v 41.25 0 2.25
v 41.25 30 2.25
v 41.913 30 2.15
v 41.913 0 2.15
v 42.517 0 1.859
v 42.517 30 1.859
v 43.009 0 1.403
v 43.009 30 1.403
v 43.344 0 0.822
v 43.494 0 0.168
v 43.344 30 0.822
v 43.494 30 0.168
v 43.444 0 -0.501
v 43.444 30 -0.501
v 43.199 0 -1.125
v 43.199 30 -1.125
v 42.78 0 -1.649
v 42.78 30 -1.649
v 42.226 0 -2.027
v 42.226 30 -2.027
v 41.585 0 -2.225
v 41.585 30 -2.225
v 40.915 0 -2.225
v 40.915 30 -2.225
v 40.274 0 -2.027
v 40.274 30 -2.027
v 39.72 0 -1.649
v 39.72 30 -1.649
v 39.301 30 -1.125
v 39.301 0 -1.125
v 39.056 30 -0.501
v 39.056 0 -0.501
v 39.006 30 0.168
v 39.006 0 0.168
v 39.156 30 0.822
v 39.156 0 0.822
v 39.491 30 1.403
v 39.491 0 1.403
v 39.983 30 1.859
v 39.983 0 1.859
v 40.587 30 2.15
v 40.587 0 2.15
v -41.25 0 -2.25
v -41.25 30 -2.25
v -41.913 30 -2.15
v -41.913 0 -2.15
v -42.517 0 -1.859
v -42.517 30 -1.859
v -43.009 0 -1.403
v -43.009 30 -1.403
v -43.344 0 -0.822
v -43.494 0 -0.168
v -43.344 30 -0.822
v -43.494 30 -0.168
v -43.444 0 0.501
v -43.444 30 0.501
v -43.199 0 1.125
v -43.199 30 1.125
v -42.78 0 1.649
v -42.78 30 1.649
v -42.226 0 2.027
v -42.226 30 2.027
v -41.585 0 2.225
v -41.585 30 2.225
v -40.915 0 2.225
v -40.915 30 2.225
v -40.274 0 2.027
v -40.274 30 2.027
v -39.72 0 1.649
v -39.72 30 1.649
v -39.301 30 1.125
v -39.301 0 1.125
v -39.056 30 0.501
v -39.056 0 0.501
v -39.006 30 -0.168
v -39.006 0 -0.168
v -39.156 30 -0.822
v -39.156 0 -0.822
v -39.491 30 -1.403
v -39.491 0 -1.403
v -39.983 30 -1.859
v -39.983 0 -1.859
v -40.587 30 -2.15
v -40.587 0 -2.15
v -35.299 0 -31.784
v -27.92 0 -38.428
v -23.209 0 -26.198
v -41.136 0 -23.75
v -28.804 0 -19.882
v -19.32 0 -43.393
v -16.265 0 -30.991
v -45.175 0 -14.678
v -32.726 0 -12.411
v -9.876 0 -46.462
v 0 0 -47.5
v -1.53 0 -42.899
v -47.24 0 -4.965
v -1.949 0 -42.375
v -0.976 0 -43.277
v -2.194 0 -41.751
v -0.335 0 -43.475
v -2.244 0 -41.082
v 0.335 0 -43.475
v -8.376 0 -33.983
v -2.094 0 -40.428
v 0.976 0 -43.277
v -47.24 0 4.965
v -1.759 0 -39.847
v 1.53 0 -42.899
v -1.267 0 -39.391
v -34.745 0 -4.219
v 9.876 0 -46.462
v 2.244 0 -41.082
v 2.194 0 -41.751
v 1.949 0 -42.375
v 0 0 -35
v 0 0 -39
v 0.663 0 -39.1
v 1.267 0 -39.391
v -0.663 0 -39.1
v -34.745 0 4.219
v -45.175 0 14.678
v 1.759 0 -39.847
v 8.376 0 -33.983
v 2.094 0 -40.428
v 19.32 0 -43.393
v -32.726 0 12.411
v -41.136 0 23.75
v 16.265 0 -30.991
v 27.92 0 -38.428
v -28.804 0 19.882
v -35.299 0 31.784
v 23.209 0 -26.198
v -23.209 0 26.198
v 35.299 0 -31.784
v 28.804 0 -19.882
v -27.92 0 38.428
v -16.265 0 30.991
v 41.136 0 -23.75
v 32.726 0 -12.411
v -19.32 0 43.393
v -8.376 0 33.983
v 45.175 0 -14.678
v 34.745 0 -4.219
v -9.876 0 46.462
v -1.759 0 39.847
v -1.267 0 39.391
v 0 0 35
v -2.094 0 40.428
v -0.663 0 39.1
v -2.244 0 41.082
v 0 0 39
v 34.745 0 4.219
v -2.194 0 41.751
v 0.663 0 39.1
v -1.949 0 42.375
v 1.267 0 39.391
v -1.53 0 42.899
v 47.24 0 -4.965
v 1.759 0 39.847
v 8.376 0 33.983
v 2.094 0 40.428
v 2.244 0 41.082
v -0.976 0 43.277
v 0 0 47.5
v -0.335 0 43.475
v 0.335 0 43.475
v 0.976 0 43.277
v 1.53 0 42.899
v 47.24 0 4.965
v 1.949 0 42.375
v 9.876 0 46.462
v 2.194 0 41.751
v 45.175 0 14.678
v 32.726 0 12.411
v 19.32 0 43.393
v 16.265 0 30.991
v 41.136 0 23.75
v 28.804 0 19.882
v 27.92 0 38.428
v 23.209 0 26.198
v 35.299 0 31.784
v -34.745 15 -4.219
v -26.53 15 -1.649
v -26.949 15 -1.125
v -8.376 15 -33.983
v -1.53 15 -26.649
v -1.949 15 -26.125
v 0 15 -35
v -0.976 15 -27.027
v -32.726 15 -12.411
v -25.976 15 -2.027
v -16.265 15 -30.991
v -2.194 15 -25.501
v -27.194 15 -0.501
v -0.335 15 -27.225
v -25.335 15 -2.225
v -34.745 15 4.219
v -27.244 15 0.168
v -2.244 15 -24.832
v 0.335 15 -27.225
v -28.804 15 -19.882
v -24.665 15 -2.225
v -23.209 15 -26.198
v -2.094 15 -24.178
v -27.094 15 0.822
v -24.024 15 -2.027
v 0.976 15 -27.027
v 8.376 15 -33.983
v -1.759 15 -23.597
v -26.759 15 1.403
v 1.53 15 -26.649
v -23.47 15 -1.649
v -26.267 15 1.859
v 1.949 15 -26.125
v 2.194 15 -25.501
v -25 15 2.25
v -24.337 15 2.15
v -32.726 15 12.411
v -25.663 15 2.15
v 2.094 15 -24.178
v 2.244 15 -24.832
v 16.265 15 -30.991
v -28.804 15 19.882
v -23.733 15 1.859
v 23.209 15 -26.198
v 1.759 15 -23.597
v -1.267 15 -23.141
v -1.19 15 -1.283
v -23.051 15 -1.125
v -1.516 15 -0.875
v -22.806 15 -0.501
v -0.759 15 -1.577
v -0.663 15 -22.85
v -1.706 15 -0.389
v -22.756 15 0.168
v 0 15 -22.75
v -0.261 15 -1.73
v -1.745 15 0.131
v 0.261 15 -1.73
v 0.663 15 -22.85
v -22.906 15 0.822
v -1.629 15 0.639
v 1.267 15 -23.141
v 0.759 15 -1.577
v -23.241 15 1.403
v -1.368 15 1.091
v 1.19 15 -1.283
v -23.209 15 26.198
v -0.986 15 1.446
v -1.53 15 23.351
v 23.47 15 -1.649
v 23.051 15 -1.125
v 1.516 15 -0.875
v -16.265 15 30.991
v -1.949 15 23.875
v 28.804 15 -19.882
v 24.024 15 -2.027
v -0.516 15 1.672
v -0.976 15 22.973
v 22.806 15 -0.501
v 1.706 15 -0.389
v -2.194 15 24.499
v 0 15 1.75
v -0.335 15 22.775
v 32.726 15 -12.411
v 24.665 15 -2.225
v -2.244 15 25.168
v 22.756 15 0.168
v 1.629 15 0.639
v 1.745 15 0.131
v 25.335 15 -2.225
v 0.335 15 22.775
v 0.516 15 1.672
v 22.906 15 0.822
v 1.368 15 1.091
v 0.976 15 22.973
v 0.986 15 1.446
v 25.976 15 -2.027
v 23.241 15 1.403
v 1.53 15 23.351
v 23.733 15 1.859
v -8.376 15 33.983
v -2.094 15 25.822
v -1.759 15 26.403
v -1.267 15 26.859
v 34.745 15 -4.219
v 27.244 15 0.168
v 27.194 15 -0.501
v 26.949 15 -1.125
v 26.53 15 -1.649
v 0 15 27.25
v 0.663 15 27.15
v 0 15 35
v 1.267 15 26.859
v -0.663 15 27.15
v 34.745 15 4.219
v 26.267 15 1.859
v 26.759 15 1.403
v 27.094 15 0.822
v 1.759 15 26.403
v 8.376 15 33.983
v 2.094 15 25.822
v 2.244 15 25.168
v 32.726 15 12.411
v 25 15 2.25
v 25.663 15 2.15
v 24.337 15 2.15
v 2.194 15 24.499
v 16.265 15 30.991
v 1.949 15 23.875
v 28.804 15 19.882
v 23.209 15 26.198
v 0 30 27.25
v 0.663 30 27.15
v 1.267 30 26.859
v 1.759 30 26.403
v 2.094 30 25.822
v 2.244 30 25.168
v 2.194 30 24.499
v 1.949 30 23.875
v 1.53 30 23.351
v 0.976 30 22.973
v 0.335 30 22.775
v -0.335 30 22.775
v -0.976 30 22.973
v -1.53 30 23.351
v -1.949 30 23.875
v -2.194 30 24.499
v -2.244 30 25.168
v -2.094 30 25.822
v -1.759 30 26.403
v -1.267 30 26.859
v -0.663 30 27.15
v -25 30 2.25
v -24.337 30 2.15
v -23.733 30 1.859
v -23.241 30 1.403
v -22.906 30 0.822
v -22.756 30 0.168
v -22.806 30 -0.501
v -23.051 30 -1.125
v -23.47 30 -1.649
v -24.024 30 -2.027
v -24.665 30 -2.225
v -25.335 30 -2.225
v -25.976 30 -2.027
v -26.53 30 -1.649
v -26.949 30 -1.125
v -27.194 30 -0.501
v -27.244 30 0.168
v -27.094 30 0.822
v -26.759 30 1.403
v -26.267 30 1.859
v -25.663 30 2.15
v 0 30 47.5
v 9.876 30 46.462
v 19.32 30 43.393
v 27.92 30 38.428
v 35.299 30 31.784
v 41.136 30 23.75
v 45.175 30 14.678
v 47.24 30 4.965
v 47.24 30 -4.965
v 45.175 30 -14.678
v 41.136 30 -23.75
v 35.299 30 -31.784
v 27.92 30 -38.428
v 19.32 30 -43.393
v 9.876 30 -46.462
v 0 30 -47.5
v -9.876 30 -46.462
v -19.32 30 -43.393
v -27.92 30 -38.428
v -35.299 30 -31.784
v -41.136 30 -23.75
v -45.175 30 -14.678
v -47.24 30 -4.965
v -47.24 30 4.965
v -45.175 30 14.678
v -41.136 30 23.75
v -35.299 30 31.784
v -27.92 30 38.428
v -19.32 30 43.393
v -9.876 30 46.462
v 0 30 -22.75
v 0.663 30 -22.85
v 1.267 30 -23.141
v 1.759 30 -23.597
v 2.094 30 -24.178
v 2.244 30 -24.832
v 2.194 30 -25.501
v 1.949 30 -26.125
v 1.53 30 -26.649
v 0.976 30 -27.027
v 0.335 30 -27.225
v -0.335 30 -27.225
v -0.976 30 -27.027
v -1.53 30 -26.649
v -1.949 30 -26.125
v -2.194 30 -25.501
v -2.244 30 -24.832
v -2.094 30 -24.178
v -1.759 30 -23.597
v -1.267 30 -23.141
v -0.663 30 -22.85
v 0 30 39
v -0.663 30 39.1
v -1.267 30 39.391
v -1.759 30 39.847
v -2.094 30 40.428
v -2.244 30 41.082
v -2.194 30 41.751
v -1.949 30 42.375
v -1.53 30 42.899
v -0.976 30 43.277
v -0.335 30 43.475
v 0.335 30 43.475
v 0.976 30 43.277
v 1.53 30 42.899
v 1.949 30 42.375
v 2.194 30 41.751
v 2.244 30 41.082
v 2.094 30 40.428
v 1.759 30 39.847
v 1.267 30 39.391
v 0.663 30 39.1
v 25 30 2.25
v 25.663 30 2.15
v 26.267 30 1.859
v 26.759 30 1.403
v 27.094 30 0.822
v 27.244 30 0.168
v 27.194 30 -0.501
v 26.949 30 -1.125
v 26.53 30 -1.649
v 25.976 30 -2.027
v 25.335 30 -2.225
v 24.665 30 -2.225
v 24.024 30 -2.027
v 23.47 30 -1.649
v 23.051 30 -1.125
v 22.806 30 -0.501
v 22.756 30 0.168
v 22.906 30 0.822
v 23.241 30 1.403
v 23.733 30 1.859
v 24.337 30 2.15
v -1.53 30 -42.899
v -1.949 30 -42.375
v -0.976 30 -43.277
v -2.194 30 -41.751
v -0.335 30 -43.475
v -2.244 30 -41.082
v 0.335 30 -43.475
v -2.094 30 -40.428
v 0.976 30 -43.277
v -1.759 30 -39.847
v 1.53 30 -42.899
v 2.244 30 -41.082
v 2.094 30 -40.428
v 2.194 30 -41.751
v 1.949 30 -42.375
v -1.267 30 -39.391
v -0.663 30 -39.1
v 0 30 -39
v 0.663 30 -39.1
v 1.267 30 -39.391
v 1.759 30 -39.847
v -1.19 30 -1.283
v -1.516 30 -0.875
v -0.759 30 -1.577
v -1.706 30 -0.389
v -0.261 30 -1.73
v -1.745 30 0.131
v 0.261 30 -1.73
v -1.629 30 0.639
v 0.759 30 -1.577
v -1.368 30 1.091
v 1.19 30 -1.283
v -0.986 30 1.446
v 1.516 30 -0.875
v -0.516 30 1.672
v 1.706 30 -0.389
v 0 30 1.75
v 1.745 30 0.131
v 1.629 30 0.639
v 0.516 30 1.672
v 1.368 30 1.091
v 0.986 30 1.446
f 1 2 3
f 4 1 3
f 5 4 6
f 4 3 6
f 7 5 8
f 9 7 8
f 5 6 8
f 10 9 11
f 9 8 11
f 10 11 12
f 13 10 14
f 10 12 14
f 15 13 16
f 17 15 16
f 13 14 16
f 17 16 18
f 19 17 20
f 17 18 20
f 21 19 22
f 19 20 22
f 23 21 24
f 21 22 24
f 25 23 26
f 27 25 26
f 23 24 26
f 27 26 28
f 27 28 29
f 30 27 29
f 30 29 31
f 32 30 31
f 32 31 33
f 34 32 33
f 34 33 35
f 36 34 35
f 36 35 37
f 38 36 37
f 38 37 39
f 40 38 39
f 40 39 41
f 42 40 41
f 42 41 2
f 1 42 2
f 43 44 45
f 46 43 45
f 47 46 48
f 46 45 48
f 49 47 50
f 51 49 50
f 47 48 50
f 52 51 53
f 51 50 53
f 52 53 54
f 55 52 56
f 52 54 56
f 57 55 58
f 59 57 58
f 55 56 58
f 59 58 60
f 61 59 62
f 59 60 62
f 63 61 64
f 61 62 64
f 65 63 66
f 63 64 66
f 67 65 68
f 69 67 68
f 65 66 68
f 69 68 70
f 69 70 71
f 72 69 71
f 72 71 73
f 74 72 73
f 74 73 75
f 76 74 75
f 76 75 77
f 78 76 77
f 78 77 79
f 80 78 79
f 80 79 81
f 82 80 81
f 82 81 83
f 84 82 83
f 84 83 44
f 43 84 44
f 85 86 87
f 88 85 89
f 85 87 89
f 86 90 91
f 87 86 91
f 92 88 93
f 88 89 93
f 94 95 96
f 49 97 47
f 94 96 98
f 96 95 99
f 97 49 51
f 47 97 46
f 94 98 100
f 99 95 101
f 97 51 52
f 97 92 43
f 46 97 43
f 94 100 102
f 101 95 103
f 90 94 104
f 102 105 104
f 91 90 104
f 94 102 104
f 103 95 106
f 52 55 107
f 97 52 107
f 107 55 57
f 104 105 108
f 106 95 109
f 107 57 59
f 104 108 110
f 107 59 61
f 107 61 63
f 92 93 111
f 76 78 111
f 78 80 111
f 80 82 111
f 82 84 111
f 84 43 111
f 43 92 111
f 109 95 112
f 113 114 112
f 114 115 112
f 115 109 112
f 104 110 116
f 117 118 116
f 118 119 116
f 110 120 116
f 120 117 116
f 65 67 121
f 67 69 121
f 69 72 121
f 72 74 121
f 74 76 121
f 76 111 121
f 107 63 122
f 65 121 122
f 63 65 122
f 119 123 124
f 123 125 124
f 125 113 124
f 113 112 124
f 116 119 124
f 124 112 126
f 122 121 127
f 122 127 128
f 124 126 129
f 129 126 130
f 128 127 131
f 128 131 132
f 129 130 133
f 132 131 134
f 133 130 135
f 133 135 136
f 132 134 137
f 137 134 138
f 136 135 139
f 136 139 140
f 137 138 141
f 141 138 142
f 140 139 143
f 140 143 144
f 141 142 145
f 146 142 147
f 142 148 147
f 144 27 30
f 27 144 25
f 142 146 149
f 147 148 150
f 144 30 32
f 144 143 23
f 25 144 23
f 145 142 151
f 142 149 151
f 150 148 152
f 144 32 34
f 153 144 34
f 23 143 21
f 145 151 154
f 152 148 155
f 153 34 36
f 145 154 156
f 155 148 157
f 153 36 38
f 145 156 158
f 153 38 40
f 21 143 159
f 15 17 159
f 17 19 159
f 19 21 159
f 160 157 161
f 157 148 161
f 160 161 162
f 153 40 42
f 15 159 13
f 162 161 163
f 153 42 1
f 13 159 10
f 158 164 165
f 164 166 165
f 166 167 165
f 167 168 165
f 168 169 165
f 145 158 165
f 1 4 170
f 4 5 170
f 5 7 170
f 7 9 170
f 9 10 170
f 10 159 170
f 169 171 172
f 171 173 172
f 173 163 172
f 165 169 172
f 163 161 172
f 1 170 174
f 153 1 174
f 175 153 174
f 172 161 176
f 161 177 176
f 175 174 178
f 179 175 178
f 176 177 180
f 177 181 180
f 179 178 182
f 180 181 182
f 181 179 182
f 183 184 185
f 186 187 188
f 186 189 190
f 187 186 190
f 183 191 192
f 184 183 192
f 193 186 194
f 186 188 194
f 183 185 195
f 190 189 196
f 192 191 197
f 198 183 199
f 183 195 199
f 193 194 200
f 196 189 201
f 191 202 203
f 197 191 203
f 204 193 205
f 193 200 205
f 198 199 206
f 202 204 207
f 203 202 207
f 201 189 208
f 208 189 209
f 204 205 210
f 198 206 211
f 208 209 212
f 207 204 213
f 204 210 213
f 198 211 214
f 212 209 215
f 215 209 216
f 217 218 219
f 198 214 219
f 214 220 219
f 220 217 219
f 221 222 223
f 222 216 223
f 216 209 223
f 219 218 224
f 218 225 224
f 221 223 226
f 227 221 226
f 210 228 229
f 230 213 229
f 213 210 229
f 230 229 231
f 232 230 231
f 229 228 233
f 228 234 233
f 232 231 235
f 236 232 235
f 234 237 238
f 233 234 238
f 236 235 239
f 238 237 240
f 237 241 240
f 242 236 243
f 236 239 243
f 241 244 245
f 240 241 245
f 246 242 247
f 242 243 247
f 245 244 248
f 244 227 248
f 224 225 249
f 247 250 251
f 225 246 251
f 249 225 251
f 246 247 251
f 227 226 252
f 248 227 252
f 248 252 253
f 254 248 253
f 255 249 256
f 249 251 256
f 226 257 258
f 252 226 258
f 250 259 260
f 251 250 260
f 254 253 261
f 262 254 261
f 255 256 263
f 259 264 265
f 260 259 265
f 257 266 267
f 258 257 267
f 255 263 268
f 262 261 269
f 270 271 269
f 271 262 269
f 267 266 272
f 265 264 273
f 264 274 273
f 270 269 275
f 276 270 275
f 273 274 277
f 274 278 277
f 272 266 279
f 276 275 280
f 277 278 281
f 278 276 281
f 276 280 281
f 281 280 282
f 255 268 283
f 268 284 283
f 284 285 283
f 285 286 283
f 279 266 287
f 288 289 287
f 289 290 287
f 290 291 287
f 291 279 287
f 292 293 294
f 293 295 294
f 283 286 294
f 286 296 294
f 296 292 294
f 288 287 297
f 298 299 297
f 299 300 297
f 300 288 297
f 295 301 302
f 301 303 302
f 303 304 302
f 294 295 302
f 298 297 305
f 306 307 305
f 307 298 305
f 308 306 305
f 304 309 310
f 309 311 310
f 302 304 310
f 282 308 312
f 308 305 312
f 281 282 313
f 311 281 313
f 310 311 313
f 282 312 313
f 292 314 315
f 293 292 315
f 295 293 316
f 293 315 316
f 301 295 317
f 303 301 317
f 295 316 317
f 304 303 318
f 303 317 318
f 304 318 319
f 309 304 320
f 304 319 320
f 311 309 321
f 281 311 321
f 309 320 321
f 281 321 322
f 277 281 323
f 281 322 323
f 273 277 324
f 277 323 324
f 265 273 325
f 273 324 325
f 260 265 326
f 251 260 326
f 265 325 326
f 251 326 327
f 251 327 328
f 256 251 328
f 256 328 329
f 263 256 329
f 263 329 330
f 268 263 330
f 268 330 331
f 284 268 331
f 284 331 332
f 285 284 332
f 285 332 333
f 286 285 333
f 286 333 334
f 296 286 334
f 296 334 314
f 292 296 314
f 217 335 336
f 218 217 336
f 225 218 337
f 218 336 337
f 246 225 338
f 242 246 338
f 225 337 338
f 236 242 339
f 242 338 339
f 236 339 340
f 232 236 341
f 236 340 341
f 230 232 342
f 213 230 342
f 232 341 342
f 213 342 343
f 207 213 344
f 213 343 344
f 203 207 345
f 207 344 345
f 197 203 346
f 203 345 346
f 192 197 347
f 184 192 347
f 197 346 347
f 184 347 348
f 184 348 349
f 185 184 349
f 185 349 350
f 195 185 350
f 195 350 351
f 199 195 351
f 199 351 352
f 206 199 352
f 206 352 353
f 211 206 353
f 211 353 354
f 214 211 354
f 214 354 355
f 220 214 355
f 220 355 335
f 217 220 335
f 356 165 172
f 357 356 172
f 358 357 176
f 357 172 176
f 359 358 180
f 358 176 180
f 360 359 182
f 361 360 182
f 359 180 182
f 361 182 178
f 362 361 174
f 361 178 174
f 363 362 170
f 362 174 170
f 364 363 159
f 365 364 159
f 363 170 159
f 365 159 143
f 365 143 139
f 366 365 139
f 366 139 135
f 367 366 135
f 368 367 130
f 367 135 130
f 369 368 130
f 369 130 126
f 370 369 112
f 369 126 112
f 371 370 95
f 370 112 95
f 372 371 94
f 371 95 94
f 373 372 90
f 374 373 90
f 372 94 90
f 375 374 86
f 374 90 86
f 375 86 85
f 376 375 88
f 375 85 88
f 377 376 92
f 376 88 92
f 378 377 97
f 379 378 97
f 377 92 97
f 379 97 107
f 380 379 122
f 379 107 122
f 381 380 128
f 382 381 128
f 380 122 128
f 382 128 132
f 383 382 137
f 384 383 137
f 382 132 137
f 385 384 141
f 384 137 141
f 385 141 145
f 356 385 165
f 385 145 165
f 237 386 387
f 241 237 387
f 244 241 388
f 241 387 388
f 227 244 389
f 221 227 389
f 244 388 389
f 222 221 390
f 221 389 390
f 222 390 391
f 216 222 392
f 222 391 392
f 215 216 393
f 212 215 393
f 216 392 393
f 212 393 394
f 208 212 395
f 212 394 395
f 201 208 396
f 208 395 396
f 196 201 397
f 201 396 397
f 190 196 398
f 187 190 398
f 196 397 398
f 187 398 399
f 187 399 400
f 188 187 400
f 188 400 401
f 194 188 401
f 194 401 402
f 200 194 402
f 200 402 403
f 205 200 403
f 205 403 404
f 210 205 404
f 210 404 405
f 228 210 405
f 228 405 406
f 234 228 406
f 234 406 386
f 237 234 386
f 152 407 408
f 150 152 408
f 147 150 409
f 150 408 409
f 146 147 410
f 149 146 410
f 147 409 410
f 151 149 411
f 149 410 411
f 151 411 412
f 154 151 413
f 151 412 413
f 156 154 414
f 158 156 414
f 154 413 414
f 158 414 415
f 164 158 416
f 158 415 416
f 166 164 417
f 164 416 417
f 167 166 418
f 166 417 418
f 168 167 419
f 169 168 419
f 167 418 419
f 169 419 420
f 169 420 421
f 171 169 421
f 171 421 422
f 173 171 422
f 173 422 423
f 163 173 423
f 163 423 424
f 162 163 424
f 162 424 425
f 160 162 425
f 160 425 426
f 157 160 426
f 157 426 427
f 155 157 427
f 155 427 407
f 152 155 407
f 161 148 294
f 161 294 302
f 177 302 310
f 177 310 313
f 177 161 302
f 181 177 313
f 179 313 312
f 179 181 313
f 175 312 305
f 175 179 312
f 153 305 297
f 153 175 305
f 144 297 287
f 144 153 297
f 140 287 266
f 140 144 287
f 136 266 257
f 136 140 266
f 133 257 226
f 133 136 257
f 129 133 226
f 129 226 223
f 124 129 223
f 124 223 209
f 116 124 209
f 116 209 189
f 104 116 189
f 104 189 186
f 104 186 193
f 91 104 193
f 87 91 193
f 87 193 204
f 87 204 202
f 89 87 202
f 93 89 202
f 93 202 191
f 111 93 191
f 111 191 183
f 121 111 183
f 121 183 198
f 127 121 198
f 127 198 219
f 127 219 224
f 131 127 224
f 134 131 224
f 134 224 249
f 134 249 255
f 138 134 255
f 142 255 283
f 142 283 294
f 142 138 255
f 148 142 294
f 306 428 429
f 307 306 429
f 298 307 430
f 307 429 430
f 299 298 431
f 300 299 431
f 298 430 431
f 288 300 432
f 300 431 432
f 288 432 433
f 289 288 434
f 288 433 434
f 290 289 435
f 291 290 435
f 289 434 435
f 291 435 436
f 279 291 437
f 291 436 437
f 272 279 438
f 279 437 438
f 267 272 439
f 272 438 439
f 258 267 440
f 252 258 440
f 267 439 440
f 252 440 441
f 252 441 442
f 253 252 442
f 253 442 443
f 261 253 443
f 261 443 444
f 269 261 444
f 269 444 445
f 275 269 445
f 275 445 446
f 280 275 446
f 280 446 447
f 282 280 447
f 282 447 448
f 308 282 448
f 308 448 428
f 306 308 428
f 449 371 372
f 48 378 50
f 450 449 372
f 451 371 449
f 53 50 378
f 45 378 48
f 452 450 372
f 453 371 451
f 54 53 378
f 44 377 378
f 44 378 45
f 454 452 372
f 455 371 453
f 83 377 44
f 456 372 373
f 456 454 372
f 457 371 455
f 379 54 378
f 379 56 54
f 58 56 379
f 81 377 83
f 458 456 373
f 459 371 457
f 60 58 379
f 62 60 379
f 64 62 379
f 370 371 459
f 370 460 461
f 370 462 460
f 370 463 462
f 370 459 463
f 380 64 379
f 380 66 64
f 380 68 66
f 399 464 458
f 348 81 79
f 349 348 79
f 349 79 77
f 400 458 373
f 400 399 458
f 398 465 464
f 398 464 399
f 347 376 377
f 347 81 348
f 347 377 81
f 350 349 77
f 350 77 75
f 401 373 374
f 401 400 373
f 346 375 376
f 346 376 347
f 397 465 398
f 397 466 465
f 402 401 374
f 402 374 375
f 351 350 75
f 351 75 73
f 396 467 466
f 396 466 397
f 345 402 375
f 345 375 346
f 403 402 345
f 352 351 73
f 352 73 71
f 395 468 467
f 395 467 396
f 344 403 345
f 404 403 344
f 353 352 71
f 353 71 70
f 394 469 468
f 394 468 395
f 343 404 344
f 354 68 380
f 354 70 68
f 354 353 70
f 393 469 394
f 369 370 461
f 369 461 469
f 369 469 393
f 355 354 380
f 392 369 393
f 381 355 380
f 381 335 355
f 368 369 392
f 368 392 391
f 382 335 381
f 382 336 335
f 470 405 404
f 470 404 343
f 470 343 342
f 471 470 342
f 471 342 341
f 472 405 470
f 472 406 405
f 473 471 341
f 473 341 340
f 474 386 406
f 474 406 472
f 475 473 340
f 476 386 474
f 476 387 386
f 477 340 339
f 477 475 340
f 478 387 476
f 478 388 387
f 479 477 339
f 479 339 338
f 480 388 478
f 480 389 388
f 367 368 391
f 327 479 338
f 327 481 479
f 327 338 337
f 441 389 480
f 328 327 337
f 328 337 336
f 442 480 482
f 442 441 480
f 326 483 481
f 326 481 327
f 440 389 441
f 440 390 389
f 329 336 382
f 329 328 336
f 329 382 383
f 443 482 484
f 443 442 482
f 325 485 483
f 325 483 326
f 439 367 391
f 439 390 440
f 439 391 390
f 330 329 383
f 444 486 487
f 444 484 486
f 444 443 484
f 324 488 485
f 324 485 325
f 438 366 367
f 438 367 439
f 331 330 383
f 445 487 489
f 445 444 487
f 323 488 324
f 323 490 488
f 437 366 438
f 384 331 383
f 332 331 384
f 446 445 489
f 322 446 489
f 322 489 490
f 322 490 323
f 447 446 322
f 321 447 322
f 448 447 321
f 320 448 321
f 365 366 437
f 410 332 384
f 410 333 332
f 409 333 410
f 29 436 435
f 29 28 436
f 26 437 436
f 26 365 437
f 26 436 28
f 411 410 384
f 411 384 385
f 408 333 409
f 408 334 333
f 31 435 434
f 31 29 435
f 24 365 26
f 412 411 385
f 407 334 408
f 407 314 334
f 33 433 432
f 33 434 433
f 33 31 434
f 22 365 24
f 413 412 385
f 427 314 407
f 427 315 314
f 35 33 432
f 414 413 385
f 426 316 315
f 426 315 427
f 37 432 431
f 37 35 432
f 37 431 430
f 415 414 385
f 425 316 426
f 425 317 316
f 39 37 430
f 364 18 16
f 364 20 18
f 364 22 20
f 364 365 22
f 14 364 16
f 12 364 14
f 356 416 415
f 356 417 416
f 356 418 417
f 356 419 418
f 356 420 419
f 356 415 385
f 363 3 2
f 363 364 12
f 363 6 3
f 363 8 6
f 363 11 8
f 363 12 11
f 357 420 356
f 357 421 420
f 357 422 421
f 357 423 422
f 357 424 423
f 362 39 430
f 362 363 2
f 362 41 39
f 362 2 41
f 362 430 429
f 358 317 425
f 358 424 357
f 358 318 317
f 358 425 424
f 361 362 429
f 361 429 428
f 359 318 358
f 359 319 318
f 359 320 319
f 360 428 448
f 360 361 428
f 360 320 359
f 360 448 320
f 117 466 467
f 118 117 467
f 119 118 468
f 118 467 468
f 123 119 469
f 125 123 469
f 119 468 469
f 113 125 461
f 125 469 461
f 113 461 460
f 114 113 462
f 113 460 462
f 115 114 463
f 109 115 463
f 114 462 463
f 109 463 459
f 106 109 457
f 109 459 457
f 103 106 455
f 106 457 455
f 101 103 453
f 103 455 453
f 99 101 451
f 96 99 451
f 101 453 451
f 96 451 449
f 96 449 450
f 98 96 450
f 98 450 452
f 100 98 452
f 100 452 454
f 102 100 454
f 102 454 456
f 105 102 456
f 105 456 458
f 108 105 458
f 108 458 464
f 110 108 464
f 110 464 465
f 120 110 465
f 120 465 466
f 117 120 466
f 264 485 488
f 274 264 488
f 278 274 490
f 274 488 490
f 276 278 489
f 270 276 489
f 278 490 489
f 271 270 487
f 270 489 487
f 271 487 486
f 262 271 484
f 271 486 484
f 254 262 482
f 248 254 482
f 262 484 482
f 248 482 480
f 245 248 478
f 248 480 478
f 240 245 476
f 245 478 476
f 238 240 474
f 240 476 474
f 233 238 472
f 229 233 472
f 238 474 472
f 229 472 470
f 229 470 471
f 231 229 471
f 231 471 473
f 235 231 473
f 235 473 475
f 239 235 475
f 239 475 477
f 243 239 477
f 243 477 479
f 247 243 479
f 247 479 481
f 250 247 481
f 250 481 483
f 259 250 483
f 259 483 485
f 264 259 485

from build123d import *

# Parameters (mm, degrees)
SKETCH1_R           = 47.5
SKETCH1_R_2         = 35
BOSS_EXTRUDE1_DEPTH = 30
SKETCH2_R           = 2.25
CUT_EXTRUDE1_DEPTH  = 74.569694848
BOSS_EXTRUDE2_START = -15
SKETCH4_R           = 35
BOSS_EXTRUDE2_DEPTH = 15
SKETCH6_R           = 1.75
CUT_EXTRUDE2_DEPTH  = 30
SKETCH2_2_R         = 2.25
CUT_EXTRUDE3_DEPTH  = 74.569694848


with BuildPart() as part:
    # Sketch1 → Boss-Extrude1 (new body)
    with BuildSketch(Plane(origin=(0, 0, 0), x_dir=(1, 0, 0), z_dir=(0, 1, 0))):
        Circle(SKETCH1_R)
        Circle(SKETCH1_R_2, mode=Mode.SUBTRACT)
    extrude(amount=BOSS_EXTRUDE1_DEPTH)

    # Sketch2 → Cut-Extrude1 (cut, through all)
    with BuildSketch(Plane(origin=(0, 30, 0), x_dir=(1, 0, 0), z_dir=(0, 1, 0))):
        with Locations((0, 41.25)):
            Circle(SKETCH2_R)
        with Locations((41.25, 0)):
            Circle(SKETCH2_R)
        with Locations((0, -41.25)):
            Circle(SKETCH2_R)
        with Locations((-41.25, 0)):
            Circle(SKETCH2_R)
        with Locations((0, 25)):
            Circle(SKETCH2_R)
        with Locations((25, 0)):
            Circle(SKETCH2_R)
        with Locations((0, -25)):
            Circle(SKETCH2_R)
        with Locations((-25, 0)):
            Circle(SKETCH2_R)
    extrude(amount=-CUT_EXTRUDE1_DEPTH, mode=Mode.SUBTRACT)

    # Sketch4 → Boss-Extrude2 (add)
    with BuildSketch(Plane(origin=(0, 30, 0), x_dir=(1, 0, 0), z_dir=(0, 1, 0)).offset(BOSS_EXTRUDE2_START)):
        Circle(SKETCH4_R)
    extrude(amount=BOSS_EXTRUDE2_DEPTH)

    # Sketch6 → Cut-Extrude2 (cut)
    with BuildSketch(Plane(origin=(0, 30, 0), x_dir=(1, 0, 0), z_dir=(0, 1, 0))):
        Circle(SKETCH6_R)
    extrude(amount=-CUT_EXTRUDE2_DEPTH, mode=Mode.SUBTRACT)

    # Sketch2<2> → Cut-Extrude3 (cut, through all)
    with BuildSketch(Plane(origin=(0, 30, 0), x_dir=(1, 0, 0), z_dir=(0, 1, 0))):
        with Locations((0, 41.25)):
            Circle(SKETCH2_2_R)
        with Locations((41.25, 0)):
            Circle(SKETCH2_2_R)
        with Locations((0, -41.25)):
            Circle(SKETCH2_2_R)
        with Locations((-41.25, 0)):
            Circle(SKETCH2_2_R)
        with Locations((0, 25)):
            Circle(SKETCH2_2_R)
        with Locations((25, 0)):
            Circle(SKETCH2_2_R)
        with Locations((0, -25)):
            Circle(SKETCH2_2_R)
        with Locations((-25, 0)):
            Circle(SKETCH2_2_R)
    extrude(amount=-CUT_EXTRUDE3_DEPTH, mode=Mode.SUBTRACT)


solid = part.part
